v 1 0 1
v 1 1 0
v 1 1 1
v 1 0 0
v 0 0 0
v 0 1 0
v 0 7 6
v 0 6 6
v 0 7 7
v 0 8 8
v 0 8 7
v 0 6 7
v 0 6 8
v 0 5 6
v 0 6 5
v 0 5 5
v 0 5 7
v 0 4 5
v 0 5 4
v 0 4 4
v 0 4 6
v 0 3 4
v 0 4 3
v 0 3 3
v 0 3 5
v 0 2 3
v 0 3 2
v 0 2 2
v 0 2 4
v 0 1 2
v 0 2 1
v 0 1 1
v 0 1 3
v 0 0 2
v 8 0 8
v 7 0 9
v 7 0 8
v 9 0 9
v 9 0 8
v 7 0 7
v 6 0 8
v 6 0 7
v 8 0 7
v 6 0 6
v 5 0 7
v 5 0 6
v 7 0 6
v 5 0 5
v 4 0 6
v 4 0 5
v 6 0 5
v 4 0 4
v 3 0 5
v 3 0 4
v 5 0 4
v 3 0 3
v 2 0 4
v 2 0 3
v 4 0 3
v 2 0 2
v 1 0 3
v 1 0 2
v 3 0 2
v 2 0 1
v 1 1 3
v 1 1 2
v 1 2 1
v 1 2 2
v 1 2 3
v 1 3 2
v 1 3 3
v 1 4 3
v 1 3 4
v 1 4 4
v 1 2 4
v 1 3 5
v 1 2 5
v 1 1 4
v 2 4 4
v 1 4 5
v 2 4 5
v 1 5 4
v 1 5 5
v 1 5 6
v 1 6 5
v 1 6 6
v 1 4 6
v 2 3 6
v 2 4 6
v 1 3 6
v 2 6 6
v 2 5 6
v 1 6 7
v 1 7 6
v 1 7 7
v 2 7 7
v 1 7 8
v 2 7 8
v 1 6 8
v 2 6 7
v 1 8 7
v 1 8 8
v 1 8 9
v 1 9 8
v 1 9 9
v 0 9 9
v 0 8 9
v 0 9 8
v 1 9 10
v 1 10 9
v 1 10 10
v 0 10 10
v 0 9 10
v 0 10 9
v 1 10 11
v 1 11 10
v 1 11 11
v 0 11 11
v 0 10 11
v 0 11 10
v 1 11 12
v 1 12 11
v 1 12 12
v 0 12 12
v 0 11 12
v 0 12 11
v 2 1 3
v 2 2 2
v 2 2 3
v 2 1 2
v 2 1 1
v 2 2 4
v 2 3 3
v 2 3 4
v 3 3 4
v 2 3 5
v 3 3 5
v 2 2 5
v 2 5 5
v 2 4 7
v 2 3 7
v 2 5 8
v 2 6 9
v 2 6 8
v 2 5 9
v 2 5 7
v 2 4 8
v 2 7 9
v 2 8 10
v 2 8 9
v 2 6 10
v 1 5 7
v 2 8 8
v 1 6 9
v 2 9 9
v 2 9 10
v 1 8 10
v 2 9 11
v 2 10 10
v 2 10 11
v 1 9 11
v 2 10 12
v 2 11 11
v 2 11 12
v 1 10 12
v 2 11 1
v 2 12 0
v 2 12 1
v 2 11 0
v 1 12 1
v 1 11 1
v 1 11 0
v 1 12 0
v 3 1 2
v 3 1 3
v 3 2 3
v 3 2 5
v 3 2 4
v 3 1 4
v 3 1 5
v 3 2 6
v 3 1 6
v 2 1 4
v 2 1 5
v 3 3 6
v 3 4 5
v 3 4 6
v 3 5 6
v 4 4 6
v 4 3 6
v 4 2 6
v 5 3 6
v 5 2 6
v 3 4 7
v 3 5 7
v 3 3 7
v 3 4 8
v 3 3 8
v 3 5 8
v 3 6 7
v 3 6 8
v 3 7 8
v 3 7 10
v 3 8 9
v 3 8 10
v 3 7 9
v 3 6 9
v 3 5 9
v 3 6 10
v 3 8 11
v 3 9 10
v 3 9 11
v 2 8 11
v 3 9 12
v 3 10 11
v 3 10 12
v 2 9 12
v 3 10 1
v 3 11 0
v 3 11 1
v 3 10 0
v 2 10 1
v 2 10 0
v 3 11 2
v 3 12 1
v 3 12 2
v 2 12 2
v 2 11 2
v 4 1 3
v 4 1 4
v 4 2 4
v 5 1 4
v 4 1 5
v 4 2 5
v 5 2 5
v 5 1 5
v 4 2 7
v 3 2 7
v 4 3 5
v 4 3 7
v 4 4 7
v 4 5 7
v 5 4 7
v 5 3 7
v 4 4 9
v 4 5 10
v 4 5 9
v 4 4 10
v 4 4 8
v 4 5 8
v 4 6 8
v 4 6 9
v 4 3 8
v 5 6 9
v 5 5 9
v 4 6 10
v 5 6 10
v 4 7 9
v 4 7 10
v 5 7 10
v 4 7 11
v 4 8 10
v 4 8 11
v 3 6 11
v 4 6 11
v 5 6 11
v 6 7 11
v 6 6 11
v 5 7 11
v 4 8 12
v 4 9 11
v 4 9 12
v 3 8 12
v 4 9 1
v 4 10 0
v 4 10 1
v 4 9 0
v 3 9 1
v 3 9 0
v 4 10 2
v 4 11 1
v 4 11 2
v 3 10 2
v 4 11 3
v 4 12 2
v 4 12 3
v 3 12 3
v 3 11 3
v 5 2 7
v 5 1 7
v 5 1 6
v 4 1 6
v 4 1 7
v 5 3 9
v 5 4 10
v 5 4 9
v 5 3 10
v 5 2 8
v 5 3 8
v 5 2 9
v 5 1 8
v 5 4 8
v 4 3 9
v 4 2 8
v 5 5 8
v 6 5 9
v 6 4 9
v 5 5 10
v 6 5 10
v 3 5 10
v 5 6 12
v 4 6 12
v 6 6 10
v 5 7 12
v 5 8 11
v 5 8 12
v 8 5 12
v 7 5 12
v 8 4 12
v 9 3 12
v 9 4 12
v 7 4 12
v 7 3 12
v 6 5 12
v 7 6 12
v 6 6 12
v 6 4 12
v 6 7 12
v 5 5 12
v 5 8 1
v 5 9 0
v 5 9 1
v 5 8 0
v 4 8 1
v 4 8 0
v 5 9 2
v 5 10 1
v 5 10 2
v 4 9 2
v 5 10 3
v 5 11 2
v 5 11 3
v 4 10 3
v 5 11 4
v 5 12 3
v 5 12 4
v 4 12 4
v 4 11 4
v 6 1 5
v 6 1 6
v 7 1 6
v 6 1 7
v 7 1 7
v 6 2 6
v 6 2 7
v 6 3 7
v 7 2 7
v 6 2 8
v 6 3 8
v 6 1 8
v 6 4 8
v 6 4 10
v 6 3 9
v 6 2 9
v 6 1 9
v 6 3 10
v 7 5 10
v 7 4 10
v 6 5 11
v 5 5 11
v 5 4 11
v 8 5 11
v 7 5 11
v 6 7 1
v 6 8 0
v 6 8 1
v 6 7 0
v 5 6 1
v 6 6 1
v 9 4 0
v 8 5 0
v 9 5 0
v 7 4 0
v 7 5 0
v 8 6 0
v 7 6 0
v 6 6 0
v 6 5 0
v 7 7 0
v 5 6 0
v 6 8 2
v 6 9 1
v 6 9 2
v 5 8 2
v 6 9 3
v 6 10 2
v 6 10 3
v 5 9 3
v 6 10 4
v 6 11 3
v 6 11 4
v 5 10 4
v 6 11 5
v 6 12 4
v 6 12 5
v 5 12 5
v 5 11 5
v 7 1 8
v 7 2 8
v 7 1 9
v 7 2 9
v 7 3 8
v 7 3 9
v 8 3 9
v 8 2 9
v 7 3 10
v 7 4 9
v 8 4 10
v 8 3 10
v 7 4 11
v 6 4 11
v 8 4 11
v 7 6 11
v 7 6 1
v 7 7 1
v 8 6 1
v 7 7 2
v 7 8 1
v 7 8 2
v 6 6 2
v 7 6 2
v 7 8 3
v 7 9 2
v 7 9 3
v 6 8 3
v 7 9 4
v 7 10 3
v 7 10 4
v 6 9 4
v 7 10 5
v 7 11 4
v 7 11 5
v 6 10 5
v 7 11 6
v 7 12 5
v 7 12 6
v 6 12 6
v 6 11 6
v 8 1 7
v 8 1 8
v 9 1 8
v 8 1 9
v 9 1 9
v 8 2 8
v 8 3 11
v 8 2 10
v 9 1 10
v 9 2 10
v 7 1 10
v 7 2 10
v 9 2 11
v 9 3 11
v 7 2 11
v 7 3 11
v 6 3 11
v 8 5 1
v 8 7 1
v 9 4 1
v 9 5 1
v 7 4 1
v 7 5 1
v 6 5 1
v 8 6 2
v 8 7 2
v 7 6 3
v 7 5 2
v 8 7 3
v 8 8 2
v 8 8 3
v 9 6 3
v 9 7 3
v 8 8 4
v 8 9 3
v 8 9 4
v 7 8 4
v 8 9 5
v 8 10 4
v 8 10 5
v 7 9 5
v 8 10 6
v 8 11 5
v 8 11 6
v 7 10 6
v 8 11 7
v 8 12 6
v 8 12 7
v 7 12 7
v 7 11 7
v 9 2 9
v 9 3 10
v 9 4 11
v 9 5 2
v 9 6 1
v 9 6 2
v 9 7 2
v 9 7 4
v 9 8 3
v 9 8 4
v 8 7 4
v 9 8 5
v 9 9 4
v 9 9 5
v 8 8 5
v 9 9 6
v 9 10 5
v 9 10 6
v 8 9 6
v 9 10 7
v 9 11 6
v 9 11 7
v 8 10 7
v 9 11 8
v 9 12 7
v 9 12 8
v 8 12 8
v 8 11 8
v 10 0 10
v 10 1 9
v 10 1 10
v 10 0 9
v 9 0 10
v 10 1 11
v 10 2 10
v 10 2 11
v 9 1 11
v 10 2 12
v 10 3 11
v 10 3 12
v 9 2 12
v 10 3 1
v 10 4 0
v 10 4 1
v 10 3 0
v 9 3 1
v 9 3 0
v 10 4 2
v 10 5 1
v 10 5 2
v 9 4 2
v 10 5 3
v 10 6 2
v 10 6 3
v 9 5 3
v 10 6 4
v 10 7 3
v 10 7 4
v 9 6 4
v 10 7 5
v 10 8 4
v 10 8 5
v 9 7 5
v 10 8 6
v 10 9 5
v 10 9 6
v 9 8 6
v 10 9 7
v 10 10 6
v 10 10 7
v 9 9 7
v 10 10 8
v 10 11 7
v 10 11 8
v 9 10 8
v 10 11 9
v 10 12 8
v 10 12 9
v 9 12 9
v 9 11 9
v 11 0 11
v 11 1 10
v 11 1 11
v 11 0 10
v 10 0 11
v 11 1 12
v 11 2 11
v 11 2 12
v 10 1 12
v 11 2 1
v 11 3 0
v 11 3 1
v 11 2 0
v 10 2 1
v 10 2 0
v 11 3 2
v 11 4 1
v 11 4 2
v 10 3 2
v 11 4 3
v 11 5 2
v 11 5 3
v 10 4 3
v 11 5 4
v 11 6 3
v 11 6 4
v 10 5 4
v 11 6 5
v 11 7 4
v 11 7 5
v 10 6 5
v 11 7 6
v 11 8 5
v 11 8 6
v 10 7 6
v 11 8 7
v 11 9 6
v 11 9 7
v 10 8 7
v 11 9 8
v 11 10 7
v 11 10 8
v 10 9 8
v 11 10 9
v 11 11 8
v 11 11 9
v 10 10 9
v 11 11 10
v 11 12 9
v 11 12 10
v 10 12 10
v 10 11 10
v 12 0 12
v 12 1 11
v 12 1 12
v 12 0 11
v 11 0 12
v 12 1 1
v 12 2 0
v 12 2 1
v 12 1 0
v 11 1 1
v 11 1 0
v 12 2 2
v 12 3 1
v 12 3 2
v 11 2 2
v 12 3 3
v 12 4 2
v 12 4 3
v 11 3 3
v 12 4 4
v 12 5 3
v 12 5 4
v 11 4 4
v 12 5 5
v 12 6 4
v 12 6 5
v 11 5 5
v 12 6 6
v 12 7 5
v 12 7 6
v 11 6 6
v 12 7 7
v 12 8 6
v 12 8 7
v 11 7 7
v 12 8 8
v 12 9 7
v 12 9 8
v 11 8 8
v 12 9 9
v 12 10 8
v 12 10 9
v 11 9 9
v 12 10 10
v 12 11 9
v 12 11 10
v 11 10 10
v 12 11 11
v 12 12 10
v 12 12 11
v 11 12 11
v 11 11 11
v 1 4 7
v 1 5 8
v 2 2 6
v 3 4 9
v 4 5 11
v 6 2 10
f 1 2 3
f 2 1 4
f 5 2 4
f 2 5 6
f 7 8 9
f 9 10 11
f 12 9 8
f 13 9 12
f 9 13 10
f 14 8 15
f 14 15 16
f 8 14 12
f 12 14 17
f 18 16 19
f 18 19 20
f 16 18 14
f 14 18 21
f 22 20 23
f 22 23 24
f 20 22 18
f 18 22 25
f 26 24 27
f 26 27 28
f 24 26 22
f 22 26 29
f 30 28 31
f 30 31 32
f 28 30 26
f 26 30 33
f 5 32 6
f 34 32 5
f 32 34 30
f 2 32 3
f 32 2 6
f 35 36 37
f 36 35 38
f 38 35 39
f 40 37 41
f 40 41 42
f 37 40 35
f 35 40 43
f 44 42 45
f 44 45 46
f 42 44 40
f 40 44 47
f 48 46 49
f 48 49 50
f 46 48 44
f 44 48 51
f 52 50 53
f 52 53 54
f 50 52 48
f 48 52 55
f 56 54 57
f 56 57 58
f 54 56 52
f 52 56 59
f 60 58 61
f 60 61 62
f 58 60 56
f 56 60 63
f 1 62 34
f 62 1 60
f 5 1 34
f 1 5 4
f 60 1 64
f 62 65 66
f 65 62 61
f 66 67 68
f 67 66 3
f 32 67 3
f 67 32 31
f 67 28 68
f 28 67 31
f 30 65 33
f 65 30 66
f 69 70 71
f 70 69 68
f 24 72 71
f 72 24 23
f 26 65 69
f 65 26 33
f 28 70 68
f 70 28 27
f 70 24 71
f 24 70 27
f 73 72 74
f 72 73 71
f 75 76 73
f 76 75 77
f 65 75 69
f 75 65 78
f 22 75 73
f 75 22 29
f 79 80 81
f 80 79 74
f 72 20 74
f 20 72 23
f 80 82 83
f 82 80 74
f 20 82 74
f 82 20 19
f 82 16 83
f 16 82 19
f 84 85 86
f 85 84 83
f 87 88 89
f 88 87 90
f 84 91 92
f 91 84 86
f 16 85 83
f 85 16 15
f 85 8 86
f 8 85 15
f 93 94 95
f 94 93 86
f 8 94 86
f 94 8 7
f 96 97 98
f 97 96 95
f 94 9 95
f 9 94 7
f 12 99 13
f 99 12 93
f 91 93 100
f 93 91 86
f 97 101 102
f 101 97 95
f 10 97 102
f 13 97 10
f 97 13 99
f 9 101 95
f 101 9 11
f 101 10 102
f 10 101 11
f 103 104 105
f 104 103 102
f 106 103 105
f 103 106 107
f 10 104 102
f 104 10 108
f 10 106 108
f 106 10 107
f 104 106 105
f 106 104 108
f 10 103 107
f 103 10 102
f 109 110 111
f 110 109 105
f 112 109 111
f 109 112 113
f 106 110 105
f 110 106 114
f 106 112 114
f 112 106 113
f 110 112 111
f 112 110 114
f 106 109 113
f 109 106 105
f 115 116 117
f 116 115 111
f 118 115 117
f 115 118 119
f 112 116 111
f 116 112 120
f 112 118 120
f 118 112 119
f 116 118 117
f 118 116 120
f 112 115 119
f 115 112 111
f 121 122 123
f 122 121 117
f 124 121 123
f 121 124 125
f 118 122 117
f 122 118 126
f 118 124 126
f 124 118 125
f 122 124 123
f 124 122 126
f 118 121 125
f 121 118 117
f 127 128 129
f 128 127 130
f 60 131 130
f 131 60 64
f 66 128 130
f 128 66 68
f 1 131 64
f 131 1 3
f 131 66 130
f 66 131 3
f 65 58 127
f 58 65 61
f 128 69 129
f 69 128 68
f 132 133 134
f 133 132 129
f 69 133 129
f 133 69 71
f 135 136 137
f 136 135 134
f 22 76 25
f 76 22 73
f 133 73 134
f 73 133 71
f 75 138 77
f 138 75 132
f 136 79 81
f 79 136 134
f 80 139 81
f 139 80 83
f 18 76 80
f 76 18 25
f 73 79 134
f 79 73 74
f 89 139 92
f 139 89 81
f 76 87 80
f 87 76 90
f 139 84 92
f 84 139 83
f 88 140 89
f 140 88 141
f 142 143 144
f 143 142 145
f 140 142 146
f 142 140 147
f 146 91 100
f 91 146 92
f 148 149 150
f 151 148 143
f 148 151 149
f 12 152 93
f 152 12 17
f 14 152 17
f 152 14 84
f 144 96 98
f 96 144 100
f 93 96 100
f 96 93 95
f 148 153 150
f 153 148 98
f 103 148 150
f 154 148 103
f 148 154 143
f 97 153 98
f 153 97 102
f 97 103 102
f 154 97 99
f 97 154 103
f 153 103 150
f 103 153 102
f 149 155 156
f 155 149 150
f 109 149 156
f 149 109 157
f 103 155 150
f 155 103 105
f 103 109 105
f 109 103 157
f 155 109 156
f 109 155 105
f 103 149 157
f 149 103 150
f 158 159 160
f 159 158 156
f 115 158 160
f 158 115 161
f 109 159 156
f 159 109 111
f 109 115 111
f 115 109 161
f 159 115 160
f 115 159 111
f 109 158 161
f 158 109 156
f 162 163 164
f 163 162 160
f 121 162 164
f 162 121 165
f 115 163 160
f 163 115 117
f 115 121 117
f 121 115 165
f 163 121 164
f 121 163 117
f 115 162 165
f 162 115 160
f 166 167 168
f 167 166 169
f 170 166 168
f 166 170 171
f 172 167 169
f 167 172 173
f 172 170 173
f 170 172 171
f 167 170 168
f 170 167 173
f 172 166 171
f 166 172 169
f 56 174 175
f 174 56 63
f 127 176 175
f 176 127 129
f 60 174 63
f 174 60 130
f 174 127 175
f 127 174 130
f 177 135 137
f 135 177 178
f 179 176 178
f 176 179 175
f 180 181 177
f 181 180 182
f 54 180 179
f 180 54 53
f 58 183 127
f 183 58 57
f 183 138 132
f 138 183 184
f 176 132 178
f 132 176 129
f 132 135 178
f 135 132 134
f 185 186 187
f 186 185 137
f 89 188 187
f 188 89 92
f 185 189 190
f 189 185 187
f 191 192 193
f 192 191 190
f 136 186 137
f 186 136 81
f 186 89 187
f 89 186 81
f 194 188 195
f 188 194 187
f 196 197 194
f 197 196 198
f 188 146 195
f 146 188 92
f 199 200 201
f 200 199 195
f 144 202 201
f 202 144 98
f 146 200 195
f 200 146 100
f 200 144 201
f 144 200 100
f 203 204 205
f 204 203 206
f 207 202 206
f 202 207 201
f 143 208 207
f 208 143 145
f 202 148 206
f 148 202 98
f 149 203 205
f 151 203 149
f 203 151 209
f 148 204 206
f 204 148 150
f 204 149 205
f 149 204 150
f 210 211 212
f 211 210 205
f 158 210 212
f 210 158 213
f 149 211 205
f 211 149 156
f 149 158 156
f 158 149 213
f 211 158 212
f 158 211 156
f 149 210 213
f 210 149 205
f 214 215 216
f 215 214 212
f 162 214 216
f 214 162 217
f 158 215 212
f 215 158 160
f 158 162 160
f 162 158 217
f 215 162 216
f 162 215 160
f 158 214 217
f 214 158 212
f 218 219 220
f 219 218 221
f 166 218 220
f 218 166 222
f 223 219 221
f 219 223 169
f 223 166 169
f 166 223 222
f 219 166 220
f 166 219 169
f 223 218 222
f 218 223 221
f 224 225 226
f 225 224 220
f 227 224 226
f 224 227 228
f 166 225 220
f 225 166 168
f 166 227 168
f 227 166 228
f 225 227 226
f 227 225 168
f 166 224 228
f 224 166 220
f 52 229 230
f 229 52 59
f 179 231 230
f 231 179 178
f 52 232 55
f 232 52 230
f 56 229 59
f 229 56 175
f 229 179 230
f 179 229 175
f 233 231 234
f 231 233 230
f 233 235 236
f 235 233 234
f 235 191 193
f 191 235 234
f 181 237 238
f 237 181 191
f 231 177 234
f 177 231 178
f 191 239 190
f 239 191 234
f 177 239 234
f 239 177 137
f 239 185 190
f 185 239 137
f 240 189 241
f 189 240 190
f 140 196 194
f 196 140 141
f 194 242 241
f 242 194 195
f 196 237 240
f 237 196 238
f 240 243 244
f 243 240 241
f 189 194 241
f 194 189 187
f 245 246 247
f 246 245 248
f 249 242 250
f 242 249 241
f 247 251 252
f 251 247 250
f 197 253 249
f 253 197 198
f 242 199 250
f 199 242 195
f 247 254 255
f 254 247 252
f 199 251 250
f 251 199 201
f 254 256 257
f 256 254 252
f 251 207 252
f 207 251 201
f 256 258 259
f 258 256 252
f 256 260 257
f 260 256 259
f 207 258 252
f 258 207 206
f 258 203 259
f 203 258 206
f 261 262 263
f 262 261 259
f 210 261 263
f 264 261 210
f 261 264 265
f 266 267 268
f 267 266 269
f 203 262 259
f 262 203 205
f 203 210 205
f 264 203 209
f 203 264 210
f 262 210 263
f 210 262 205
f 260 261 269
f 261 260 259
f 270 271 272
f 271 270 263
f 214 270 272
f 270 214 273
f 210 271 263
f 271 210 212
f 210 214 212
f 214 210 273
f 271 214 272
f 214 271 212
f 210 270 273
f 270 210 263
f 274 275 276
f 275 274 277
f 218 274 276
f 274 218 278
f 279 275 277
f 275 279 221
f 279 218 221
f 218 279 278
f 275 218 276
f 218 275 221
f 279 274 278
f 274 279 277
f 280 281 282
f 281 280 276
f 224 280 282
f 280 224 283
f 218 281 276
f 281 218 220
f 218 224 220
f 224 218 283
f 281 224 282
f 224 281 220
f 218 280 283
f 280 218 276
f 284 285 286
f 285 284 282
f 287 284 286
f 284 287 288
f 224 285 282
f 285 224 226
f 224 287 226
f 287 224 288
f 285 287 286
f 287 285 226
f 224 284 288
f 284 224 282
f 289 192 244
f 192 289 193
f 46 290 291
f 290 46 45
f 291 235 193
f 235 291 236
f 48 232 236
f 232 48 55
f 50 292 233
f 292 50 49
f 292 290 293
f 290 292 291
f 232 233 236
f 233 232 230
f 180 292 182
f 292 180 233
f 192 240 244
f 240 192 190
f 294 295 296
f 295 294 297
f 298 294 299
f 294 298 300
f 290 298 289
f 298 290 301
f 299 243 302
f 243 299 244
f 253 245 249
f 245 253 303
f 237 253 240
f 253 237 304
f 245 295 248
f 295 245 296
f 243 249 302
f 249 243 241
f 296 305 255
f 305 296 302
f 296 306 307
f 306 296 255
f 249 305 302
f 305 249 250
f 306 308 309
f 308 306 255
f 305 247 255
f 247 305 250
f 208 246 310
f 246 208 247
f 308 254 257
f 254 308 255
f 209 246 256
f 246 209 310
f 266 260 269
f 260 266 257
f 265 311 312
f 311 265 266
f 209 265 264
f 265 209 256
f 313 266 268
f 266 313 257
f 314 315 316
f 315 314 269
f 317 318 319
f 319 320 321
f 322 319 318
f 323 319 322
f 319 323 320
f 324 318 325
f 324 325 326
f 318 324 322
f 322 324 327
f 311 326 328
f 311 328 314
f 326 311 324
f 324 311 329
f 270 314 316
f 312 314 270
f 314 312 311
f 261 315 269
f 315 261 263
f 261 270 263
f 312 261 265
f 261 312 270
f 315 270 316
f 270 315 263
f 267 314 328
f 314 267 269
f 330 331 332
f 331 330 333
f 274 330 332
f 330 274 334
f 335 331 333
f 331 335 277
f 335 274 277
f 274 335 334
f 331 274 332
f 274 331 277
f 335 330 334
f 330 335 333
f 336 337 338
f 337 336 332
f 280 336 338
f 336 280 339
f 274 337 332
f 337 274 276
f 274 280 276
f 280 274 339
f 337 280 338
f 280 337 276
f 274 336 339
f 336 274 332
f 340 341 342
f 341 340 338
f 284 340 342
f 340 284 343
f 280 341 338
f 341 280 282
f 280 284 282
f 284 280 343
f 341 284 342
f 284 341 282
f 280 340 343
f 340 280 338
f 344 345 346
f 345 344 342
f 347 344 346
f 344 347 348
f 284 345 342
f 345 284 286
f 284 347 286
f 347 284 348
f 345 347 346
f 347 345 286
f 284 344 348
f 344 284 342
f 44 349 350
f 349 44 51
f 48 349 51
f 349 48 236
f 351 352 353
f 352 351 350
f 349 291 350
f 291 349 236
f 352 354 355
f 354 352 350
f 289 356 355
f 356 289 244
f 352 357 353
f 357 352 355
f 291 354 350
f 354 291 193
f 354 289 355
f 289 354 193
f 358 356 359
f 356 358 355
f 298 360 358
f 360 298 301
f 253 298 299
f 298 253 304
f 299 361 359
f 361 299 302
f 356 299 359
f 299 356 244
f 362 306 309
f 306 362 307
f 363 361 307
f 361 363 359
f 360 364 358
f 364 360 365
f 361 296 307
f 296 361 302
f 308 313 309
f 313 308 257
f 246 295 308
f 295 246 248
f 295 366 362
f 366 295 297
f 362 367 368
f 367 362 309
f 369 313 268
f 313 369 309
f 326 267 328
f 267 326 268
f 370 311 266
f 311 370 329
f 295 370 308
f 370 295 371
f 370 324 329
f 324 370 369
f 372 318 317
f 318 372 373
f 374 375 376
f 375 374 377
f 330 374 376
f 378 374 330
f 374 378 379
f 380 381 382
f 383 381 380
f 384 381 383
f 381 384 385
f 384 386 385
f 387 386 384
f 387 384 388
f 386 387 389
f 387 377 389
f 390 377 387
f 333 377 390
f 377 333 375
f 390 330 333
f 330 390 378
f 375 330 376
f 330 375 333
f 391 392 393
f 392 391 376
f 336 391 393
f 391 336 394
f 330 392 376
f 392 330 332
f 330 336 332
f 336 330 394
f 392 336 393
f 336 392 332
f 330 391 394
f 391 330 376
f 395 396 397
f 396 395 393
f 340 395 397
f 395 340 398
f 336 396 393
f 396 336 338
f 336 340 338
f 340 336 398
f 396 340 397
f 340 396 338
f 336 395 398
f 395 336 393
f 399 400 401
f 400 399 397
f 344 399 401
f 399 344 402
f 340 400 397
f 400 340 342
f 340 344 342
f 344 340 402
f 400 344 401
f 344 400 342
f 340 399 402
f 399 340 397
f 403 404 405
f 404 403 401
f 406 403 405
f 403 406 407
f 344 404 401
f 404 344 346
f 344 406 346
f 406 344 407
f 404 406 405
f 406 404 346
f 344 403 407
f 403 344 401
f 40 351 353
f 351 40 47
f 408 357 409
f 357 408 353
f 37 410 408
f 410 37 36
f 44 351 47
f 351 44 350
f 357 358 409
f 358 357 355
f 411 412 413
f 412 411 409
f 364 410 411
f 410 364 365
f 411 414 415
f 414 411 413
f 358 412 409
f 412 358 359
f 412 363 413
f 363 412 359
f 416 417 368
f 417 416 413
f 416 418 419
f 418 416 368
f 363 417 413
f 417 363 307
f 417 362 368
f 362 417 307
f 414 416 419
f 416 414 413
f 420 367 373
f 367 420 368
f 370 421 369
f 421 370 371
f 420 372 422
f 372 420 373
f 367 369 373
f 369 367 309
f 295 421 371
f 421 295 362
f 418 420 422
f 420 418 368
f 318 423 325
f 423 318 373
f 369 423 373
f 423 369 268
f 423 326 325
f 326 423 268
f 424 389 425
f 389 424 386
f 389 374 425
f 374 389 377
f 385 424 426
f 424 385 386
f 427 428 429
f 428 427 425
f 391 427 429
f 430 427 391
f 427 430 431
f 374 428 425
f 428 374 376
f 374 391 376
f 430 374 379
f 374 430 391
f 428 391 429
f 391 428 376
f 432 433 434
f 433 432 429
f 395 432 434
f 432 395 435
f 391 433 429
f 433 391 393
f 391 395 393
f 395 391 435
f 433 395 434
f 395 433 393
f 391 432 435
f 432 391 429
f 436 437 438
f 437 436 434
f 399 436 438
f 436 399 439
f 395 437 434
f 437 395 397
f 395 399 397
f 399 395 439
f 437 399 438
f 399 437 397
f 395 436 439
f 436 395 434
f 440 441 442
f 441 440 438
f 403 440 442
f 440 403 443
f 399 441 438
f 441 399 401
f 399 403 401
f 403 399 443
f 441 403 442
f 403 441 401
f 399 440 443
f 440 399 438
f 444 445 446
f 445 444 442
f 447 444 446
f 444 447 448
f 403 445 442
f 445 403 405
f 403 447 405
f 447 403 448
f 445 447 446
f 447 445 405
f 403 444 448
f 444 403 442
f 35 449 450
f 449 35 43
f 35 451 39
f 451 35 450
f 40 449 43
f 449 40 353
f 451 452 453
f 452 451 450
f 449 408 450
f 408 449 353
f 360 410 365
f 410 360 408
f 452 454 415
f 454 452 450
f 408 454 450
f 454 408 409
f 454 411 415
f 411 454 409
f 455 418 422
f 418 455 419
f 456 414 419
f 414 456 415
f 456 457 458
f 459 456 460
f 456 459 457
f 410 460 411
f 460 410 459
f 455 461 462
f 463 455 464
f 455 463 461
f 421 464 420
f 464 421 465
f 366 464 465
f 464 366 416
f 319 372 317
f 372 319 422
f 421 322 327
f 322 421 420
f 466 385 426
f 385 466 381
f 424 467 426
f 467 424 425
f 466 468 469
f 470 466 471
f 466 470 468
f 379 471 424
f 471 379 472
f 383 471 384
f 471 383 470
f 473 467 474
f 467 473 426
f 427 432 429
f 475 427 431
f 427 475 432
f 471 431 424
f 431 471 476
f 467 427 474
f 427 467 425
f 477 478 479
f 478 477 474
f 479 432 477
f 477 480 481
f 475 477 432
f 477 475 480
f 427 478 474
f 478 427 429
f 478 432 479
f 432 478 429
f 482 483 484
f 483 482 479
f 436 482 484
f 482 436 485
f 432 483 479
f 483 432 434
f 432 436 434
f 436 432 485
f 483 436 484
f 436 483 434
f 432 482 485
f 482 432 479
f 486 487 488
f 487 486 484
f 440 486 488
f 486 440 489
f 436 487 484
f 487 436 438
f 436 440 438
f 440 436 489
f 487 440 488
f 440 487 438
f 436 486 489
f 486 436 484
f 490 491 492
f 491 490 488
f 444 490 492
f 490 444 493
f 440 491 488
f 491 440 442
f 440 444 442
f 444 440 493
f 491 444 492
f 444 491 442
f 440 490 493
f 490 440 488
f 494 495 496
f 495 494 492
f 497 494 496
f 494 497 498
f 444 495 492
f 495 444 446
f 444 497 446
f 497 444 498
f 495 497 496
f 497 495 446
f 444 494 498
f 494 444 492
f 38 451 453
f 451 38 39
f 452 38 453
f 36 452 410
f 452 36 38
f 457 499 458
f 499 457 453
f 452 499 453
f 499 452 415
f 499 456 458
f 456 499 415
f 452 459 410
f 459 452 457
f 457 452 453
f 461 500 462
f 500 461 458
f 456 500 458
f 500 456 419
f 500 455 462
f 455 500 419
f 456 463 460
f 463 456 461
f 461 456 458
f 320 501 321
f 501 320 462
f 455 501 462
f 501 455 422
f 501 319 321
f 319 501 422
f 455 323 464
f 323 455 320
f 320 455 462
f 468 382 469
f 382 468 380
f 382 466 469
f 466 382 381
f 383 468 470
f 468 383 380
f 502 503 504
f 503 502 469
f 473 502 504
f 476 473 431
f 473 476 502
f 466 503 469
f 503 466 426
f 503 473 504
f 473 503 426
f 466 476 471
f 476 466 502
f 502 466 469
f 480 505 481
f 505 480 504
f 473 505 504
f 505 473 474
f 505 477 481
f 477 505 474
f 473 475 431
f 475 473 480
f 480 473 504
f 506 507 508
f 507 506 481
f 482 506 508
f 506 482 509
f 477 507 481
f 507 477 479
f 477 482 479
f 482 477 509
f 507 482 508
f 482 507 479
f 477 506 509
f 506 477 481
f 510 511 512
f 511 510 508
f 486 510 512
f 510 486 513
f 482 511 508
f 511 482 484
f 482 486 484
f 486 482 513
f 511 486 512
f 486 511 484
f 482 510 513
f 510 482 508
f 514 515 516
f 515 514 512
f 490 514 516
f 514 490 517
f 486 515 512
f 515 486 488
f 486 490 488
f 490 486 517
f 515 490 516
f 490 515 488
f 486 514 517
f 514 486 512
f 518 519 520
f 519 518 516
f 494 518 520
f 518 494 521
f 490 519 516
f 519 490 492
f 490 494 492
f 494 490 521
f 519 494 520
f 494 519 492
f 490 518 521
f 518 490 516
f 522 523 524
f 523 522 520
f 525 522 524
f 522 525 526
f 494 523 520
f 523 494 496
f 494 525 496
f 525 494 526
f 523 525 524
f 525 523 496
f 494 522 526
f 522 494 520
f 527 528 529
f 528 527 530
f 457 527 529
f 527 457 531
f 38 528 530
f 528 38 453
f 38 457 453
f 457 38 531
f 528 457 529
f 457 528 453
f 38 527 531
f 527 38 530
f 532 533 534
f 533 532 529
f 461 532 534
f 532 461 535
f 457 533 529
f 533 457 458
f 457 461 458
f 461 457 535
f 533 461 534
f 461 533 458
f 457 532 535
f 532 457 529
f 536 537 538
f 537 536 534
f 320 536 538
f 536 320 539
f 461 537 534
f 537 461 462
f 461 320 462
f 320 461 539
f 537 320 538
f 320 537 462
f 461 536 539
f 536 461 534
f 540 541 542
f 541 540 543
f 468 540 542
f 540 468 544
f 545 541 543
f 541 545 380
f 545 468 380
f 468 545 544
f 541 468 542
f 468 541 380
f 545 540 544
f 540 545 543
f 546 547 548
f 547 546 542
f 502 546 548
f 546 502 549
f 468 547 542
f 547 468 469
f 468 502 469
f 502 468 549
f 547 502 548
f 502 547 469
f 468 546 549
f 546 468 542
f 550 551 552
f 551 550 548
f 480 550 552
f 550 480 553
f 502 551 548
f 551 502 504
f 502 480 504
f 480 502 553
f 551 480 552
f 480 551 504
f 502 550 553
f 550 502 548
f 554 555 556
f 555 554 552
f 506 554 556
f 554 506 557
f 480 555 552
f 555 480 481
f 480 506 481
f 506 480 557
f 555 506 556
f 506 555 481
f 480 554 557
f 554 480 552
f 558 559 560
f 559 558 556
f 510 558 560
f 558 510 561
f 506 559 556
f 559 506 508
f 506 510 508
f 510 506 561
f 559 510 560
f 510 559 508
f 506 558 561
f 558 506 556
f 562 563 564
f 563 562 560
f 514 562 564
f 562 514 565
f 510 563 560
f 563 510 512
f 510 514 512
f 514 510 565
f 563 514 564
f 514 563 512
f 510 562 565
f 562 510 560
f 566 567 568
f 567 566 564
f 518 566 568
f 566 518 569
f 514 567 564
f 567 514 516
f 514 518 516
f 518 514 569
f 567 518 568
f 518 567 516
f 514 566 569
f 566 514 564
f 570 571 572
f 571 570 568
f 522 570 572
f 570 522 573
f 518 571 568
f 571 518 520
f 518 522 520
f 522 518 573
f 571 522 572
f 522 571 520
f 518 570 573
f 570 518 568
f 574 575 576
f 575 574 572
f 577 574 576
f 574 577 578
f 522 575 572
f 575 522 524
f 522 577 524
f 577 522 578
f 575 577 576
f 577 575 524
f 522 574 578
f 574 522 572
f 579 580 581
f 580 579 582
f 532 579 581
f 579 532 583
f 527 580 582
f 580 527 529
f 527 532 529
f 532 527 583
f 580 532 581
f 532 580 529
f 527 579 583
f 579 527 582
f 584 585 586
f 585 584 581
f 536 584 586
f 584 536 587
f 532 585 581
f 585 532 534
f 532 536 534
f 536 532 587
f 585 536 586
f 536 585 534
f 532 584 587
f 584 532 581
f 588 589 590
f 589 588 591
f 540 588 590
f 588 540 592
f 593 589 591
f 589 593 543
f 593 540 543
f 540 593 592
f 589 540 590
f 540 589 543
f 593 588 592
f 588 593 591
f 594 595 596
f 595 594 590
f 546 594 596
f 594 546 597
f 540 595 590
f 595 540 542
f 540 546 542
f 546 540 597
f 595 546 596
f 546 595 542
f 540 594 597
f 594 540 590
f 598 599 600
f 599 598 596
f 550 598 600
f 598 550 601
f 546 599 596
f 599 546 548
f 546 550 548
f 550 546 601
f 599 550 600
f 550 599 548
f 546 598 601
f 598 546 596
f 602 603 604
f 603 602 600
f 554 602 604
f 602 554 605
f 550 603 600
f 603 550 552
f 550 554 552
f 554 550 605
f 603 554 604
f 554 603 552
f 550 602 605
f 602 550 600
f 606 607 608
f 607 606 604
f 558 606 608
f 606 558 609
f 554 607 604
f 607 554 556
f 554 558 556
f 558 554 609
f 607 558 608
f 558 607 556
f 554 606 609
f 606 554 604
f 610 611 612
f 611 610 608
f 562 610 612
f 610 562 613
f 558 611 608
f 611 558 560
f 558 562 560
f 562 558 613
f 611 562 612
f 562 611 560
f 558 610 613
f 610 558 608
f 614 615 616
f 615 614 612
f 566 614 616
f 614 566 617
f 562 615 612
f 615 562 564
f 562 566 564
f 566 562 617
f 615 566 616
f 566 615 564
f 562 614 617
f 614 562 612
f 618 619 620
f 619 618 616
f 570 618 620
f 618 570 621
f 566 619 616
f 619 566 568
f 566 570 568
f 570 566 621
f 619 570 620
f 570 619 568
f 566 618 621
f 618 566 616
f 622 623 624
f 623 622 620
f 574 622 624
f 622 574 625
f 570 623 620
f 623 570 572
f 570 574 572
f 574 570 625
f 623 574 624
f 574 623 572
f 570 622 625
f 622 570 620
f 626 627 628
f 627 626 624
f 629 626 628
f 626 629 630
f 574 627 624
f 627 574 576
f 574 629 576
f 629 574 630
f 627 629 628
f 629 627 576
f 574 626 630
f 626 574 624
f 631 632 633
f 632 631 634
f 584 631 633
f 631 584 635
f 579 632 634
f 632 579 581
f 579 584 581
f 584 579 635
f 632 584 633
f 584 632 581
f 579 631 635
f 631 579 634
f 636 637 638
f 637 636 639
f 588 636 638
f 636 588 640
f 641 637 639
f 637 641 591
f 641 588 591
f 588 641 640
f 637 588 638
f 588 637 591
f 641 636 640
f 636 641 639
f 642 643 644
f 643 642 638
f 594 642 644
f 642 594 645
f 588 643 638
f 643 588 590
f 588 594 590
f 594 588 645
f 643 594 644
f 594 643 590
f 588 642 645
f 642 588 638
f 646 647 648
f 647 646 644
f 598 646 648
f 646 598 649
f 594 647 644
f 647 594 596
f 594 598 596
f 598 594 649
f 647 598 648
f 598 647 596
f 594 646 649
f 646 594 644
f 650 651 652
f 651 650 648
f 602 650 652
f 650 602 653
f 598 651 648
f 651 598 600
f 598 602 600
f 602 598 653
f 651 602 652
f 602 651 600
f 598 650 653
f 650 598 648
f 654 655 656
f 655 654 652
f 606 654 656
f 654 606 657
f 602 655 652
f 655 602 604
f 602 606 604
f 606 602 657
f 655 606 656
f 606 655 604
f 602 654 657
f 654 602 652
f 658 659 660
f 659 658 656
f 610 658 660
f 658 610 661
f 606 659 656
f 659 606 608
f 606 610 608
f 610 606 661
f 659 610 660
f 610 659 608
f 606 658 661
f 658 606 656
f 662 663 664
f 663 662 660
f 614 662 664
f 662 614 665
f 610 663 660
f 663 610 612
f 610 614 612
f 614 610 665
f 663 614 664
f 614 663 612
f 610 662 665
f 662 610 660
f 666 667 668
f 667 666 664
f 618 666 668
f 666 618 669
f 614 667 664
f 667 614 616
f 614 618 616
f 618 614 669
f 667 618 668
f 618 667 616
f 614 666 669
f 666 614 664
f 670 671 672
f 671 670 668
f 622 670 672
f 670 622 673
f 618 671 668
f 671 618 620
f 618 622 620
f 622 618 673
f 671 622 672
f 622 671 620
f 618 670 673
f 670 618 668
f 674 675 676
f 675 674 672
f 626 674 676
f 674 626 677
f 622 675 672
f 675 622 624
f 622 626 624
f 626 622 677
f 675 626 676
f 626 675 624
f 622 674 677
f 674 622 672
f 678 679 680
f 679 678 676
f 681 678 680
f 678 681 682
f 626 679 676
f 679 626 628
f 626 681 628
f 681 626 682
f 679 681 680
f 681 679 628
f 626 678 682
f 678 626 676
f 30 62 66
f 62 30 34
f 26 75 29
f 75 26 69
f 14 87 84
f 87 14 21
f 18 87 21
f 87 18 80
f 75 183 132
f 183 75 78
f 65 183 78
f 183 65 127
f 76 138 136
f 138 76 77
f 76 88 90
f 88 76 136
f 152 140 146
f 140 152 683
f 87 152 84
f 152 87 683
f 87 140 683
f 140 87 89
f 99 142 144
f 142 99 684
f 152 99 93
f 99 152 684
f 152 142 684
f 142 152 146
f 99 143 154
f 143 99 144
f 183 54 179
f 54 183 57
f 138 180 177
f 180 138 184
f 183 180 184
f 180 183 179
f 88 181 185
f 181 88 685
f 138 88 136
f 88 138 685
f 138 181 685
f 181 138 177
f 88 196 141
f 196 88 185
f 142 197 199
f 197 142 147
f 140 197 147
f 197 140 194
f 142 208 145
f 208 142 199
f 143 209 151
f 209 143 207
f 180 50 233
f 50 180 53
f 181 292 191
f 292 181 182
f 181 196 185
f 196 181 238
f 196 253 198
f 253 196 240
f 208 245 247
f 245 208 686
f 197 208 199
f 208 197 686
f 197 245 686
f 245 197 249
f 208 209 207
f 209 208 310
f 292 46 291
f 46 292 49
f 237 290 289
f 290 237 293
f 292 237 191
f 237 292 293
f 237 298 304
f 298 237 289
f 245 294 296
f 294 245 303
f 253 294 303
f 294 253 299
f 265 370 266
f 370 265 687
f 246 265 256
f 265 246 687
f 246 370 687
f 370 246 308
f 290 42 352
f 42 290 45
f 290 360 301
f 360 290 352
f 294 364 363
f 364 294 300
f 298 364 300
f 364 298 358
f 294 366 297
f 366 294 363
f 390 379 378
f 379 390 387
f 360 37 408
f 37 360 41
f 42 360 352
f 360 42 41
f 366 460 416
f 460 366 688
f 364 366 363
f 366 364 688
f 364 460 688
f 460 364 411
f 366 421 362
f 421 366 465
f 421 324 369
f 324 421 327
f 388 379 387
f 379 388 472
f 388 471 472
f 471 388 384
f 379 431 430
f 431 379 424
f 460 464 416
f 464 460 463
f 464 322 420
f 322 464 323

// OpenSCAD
union() {
    translate([0, 0, 0]) cube([1, 1, 1]);
    translate([0, 1, 1]) cube([1, 1, 1]);
    translate([0, 2, 2]) cube([1, 1, 1]);
    translate([0, 3, 3]) cube([1, 1, 1]);
    translate([0, 4, 4]) cube([1, 1, 1]);
    translate([0, 5, 5]) cube([1, 1, 1]);
    translate([0, 6, 6]) cube([1, 1, 1]);
    translate([0, 7, 7]) cube([1, 1, 1]);
    translate([0, 8, 8]) cube([1, 1, 1]);
    translate([0, 9, 9]) cube([1, 1, 1]);
    translate([0, 10, 10]) cube([1, 1, 1]);
    translate([0, 11, 11]) cube([1, 1, 1]);
    translate([1, 0, 1]) cube([1, 1, 1]);
    translate([1, 1, 2]) cube([1, 1, 1]);
    translate([1, 2, 3]) cube([1, 1, 1]);
    translate([1, 3, 4]) cube([1, 1, 1]);
    translate([1, 4, 5]) cube([1, 1, 1]);
    translate([1, 5, 6]) cube([1, 1, 1]);
    translate([1, 6, 7]) cube([1, 1, 1]);
    translate([1, 7, 8]) cube([1, 1, 1]);
    translate([1, 8, 9]) cube([1, 1, 1]);
    translate([1, 9, 10]) cube([1, 1, 1]);
    translate([1, 10, 11]) cube([1, 1, 1]);
    translate([1, 11, 0]) cube([1, 1, 1]);
    translate([2, 0, 2]) cube([1, 1, 1]);
    translate([2, 1, 3]) cube([1, 1, 1]);
    translate([2, 2, 4]) cube([1, 1, 1]);
    translate([2, 3, 5]) cube([1, 1, 1]);
    translate([2, 4, 6]) cube([1, 1, 1]);
    translate([2, 5, 7]) cube([1, 1, 1]);
    translate([2, 6, 8]) cube([1, 1, 1]);
    translate([2, 7, 9]) cube([1, 1, 1]);
    translate([2, 8, 10]) cube([1, 1, 1]);
    translate([2, 9, 11]) cube([1, 1, 1]);
    translate([2, 10, 0]) cube([1, 1, 1]);
    translate([2, 11, 1]) cube([1, 1, 1]);
    translate([3, 0, 3]) cube([1, 1, 1]);
    translate([3, 1, 4]) cube([1, 1, 1]);
    translate([3, 2, 5]) cube([1, 1, 1]);
    translate([3, 3, 6]) cube([1, 1, 1]);
    translate([3, 4, 7]) cube([1, 1, 1]);
    translate([3, 5, 8]) cube([1, 1, 1]);
    translate([3, 6, 9]) cube([1, 1, 1]);
    translate([3, 7, 10]) cube([1, 1, 1]);
    translate([3, 8, 11]) cube([1, 1, 1]);
    translate([3, 9, 0]) cube([1, 1, 1]);
    translate([3, 10, 1]) cube([1, 1, 1]);
    translate([3, 11, 2]) cube([1, 1, 1]);
    translate([4, 0, 4]) cube([1, 1, 1]);
    translate([4, 1, 5]) cube([1, 1, 1]);
    translate([4, 2, 6]) cube([1, 1, 1]);
    translate([4, 3, 7]) cube([1, 1, 1]);
    translate([4, 4, 8]) cube([1, 1, 1]);
    translate([4, 5, 9]) cube([1, 1, 1]);
    translate([4, 6, 10]) cube([1, 1, 1]);
    translate([4, 7, 11]) cube([1, 1, 1]);
    translate([4, 8, 0]) cube([1, 1, 1]);
    translate([4, 9, 1]) cube([1, 1, 1]);
    translate([4, 10, 2]) cube([1, 1, 1]);
    translate([4, 11, 3]) cube([1, 1, 1]);
    translate([5, 0, 5]) cube([1, 1, 1]);
    translate([5, 1, 6]) cube([1, 1, 1]);
    translate([5, 2, 7]) cube([1, 1, 1]);
    translate([5, 3, 8]) cube([1, 1, 1]);
    translate([5, 4, 9]) cube([1, 1, 1]);
    translate([5, 5, 10]) cube([1, 1, 1]);
    translate([5, 6, 11]) cube([1, 1, 1]);
    translate([5, 7, 0]) cube([1, 1, 1]);
    translate([5, 8, 1]) cube([1, 1, 1]);
    translate([5, 9, 2]) cube([1, 1, 1]);
    translate([5, 10, 3]) cube([1, 1, 1]);
    translate([5, 11, 4]) cube([1, 1, 1]);
    translate([6, 0, 6]) cube([1, 1, 1]);
    translate([6, 1, 7]) cube([1, 1, 1]);
    translate([6, 2, 8]) cube([1, 1, 1]);
    translate([6, 3, 9]) cube([1, 1, 1]);
    translate([6, 4, 10]) cube([1, 1, 1]);
    translate([6, 5, 11]) cube([1, 1, 1]);
    translate([6, 6, 0]) cube([1, 1, 1]);
    translate([6, 7, 1]) cube([1, 1, 1]);
    translate([6, 8, 2]) cube([1, 1, 1]);
    translate([6, 9, 3]) cube([1, 1, 1]);
    translate([6, 10, 4]) cube([1, 1, 1]);
    translate([6, 11, 5]) cube([1, 1, 1]);
    translate([7, 0, 7]) cube([1, 1, 1]);
    translate([7, 1, 8]) cube([1, 1, 1]);
    translate([7, 2, 9]) cube([1, 1, 1]);
    translate([7, 3, 10]) cube([1, 1, 1]);
    translate([7, 4, 11]) cube([1, 1, 1]);
    translate([7, 5, 0]) cube([1, 1, 1]);
    translate([7, 6, 1]) cube([1, 1, 1]);
    translate([7, 7, 2]) cube([1, 1, 1]);
    translate([7, 8, 3]) cube([1, 1, 1]);
    translate([7, 9, 4]) cube([1, 1, 1]);
    translate([7, 10, 5]) cube([1, 1, 1]);
    translate([7, 11, 6]) cube([1, 1, 1]);
    translate([8, 0, 8]) cube([1, 1, 1]);
    translate([8, 1, 9]) cube([1, 1, 1]);
    translate([8, 2, 10]) cube([1, 1, 1]);
    translate([8, 3, 11]) cube([1, 1, 1]);
    translate([8, 4, 0]) cube([1, 1, 1]);
    translate([8, 5, 1]) cube([1, 1, 1]);
    translate([8, 6, 2]) cube([1, 1, 1]);
    translate([8, 7, 3]) cube([1, 1, 1]);
    translate([8, 8, 4]) cube([1, 1, 1]);
    translate([8, 9, 5]) cube([1, 1, 1]);
    translate([8, 10, 6]) cube([1, 1, 1]);
    translate([8, 11, 7]) cube([1, 1, 1]);
    translate([9, 0, 9]) cube([1, 1, 1]);
    translate([9, 1, 10]) cube([1, 1, 1]);
    translate([9, 2, 11]) cube([1, 1, 1]);
    translate([9, 3, 0]) cube([1, 1, 1]);
    translate([9, 4, 1]) cube([1, 1, 1]);
    translate([9, 5, 2]) cube([1, 1, 1]);
    translate([9, 6, 3]) cube([1, 1, 1]);
    translate([9, 7, 4]) cube([1, 1, 1]);
    translate([9, 8, 5]) cube([1, 1, 1]);
    translate([9, 9, 6]) cube([1, 1, 1]);
    translate([9, 10, 7]) cube([1, 1, 1]);
    translate([9, 11, 8]) cube([1, 1, 1]);
    translate([10, 0, 10]) cube([1, 1, 1]);
    translate([10, 1, 11]) cube([1, 1, 1]);
    translate([10, 2, 0]) cube([1, 1, 1]);
    translate([10, 3, 1]) cube([1, 1, 1]);
    translate([10, 4, 2]) cube([1, 1, 1]);
    translate([10, 5, 3]) cube([1, 1, 1]);
    translate([10, 6, 4]) cube([1, 1, 1]);
    translate([10, 7, 5]) cube([1, 1, 1]);
    translate([10, 8, 6]) cube([1, 1, 1]);
    translate([10, 9, 7]) cube([1, 1, 1]);
    translate([10, 10, 8]) cube([1, 1, 1]);
    translate([10, 11, 9]) cube([1, 1, 1]);
    translate([11, 0, 11]) cube([1, 1, 1]);
    translate([11, 1, 0]) cube([1, 1, 1]);
    translate([11, 2, 1]) cube([1, 1, 1]);
    translate([11, 3, 2]) cube([1, 1, 1]);
    translate([11, 4, 3]) cube([1, 1, 1]);
    translate([11, 5, 4]) cube([1, 1, 1]);
    translate([11, 6, 5]) cube([1, 1, 1]);
    translate([11, 7, 6]) cube([1, 1, 1]);
    translate([11, 8, 7]) cube([1, 1, 1]);
    translate([11, 9, 8]) cube([1, 1, 1]);
    translate([11, 10, 9]) cube([1, 1, 1]);
    translate([11, 11, 10]) cube([1, 1, 1]);
    translate([0, 0, 1]) cube([1, 1, 1]);
    translate([0, 1, 2]) cube([1, 1, 1]);
    translate([0, 2, 3]) cube([1, 1, 1]);
    translate([0, 3, 4]) cube([1, 1, 1]);
    translate([0, 4, 5]) cube([1, 1, 1]);
    translate([0, 5, 6]) cube([1, 1, 1]);
    translate([0, 6, 7]) cube([1, 1, 1]);
    translate([1, 0, 2]) cube([1, 1, 1]);
    translate([1, 1, 3]) cube([1, 1, 1]);
    translate([1, 2, 4]) cube([1, 1, 1]);
    translate([1, 3, 5]) cube([1, 1, 1]);
    translate([1, 4, 6]) cube([1, 1, 1]);
    translate([1, 5, 7]) cube([1, 1, 1]);
    translate([1, 6, 8]) cube([1, 1, 1]);
    translate([2, 0, 3]) cube([1, 1, 1]);
    translate([2, 1, 4]) cube([1, 1, 1]);
    translate([2, 2, 5]) cube([1, 1, 1]);
    translate([2, 3, 6]) cube([1, 1, 1]);
    translate([2, 4, 7]) cube([1, 1, 1]);
    translate([2, 5, 8]) cube([1, 1, 1]);
    translate([2, 6, 9]) cube([1, 1, 1]);
    translate([3, 0, 4]) cube([1, 1, 1]);
    translate([3, 1, 5]) cube([1, 1, 1]);
    translate([3, 2, 6]) cube([1, 1, 1]);
    translate([3, 3, 7]) cube([1, 1, 1]);
    translate([3, 4, 8]) cube([1, 1, 1]);
    translate([3, 5, 9]) cube([1, 1, 1]);
    translate([3, 6, 10]) cube([1, 1, 1]);
    translate([4, 0, 5]) cube([1, 1, 1]);
    translate([4, 1, 6]) cube([1, 1, 1]);
    translate([4, 2, 7]) cube([1, 1, 1]);
    translate([4, 3, 8]) cube([1, 1, 1]);
    translate([4, 4, 9]) cube([1, 1, 1]);
    translate([4, 5, 10]) cube([1, 1, 1]);
    translate([4, 6, 11]) cube([1, 1, 1]);
    translate([5, 0, 6]) cube([1, 1, 1]);
    translate([5, 1, 7]) cube([1, 1, 1]);
    translate([5, 2, 8]) cube([1, 1, 1]);
    translate([5, 3, 9]) cube([1, 1, 1]);
    translate([5, 4, 10]) cube([1, 1, 1]);
    translate([5, 5, 11]) cube([1, 1, 1]);
    translate([5, 6, 0]) cube([1, 1, 1]);
    translate([6, 0, 7]) cube([1, 1, 1]);
    translate([6, 1, 8]) cube([1, 1, 1]);
    translate([6, 2, 9]) cube([1, 1, 1]);
    translate([6, 3, 10]) cube([1, 1, 1]);
    translate([6, 4, 11]) cube([1, 1, 1]);
    translate([6, 5, 0]) cube([1, 1, 1]);
    translate([6, 6, 1]) cube([1, 1, 1]);
    translate([7, 0, 8]) cube([1, 1, 1]);
    translate([7, 1, 9]) cube([1, 1, 1]);
    translate([7, 2, 10]) cube([1, 1, 1]);
    translate([7, 3, 11]) cube([1, 1, 1]);
    translate([7, 4, 0]) cube([1, 1, 1]);
    translate([7, 5, 1]) cube([1, 1, 1]);
    translate([7, 6, 2]) cube([1, 1, 1]);
}
